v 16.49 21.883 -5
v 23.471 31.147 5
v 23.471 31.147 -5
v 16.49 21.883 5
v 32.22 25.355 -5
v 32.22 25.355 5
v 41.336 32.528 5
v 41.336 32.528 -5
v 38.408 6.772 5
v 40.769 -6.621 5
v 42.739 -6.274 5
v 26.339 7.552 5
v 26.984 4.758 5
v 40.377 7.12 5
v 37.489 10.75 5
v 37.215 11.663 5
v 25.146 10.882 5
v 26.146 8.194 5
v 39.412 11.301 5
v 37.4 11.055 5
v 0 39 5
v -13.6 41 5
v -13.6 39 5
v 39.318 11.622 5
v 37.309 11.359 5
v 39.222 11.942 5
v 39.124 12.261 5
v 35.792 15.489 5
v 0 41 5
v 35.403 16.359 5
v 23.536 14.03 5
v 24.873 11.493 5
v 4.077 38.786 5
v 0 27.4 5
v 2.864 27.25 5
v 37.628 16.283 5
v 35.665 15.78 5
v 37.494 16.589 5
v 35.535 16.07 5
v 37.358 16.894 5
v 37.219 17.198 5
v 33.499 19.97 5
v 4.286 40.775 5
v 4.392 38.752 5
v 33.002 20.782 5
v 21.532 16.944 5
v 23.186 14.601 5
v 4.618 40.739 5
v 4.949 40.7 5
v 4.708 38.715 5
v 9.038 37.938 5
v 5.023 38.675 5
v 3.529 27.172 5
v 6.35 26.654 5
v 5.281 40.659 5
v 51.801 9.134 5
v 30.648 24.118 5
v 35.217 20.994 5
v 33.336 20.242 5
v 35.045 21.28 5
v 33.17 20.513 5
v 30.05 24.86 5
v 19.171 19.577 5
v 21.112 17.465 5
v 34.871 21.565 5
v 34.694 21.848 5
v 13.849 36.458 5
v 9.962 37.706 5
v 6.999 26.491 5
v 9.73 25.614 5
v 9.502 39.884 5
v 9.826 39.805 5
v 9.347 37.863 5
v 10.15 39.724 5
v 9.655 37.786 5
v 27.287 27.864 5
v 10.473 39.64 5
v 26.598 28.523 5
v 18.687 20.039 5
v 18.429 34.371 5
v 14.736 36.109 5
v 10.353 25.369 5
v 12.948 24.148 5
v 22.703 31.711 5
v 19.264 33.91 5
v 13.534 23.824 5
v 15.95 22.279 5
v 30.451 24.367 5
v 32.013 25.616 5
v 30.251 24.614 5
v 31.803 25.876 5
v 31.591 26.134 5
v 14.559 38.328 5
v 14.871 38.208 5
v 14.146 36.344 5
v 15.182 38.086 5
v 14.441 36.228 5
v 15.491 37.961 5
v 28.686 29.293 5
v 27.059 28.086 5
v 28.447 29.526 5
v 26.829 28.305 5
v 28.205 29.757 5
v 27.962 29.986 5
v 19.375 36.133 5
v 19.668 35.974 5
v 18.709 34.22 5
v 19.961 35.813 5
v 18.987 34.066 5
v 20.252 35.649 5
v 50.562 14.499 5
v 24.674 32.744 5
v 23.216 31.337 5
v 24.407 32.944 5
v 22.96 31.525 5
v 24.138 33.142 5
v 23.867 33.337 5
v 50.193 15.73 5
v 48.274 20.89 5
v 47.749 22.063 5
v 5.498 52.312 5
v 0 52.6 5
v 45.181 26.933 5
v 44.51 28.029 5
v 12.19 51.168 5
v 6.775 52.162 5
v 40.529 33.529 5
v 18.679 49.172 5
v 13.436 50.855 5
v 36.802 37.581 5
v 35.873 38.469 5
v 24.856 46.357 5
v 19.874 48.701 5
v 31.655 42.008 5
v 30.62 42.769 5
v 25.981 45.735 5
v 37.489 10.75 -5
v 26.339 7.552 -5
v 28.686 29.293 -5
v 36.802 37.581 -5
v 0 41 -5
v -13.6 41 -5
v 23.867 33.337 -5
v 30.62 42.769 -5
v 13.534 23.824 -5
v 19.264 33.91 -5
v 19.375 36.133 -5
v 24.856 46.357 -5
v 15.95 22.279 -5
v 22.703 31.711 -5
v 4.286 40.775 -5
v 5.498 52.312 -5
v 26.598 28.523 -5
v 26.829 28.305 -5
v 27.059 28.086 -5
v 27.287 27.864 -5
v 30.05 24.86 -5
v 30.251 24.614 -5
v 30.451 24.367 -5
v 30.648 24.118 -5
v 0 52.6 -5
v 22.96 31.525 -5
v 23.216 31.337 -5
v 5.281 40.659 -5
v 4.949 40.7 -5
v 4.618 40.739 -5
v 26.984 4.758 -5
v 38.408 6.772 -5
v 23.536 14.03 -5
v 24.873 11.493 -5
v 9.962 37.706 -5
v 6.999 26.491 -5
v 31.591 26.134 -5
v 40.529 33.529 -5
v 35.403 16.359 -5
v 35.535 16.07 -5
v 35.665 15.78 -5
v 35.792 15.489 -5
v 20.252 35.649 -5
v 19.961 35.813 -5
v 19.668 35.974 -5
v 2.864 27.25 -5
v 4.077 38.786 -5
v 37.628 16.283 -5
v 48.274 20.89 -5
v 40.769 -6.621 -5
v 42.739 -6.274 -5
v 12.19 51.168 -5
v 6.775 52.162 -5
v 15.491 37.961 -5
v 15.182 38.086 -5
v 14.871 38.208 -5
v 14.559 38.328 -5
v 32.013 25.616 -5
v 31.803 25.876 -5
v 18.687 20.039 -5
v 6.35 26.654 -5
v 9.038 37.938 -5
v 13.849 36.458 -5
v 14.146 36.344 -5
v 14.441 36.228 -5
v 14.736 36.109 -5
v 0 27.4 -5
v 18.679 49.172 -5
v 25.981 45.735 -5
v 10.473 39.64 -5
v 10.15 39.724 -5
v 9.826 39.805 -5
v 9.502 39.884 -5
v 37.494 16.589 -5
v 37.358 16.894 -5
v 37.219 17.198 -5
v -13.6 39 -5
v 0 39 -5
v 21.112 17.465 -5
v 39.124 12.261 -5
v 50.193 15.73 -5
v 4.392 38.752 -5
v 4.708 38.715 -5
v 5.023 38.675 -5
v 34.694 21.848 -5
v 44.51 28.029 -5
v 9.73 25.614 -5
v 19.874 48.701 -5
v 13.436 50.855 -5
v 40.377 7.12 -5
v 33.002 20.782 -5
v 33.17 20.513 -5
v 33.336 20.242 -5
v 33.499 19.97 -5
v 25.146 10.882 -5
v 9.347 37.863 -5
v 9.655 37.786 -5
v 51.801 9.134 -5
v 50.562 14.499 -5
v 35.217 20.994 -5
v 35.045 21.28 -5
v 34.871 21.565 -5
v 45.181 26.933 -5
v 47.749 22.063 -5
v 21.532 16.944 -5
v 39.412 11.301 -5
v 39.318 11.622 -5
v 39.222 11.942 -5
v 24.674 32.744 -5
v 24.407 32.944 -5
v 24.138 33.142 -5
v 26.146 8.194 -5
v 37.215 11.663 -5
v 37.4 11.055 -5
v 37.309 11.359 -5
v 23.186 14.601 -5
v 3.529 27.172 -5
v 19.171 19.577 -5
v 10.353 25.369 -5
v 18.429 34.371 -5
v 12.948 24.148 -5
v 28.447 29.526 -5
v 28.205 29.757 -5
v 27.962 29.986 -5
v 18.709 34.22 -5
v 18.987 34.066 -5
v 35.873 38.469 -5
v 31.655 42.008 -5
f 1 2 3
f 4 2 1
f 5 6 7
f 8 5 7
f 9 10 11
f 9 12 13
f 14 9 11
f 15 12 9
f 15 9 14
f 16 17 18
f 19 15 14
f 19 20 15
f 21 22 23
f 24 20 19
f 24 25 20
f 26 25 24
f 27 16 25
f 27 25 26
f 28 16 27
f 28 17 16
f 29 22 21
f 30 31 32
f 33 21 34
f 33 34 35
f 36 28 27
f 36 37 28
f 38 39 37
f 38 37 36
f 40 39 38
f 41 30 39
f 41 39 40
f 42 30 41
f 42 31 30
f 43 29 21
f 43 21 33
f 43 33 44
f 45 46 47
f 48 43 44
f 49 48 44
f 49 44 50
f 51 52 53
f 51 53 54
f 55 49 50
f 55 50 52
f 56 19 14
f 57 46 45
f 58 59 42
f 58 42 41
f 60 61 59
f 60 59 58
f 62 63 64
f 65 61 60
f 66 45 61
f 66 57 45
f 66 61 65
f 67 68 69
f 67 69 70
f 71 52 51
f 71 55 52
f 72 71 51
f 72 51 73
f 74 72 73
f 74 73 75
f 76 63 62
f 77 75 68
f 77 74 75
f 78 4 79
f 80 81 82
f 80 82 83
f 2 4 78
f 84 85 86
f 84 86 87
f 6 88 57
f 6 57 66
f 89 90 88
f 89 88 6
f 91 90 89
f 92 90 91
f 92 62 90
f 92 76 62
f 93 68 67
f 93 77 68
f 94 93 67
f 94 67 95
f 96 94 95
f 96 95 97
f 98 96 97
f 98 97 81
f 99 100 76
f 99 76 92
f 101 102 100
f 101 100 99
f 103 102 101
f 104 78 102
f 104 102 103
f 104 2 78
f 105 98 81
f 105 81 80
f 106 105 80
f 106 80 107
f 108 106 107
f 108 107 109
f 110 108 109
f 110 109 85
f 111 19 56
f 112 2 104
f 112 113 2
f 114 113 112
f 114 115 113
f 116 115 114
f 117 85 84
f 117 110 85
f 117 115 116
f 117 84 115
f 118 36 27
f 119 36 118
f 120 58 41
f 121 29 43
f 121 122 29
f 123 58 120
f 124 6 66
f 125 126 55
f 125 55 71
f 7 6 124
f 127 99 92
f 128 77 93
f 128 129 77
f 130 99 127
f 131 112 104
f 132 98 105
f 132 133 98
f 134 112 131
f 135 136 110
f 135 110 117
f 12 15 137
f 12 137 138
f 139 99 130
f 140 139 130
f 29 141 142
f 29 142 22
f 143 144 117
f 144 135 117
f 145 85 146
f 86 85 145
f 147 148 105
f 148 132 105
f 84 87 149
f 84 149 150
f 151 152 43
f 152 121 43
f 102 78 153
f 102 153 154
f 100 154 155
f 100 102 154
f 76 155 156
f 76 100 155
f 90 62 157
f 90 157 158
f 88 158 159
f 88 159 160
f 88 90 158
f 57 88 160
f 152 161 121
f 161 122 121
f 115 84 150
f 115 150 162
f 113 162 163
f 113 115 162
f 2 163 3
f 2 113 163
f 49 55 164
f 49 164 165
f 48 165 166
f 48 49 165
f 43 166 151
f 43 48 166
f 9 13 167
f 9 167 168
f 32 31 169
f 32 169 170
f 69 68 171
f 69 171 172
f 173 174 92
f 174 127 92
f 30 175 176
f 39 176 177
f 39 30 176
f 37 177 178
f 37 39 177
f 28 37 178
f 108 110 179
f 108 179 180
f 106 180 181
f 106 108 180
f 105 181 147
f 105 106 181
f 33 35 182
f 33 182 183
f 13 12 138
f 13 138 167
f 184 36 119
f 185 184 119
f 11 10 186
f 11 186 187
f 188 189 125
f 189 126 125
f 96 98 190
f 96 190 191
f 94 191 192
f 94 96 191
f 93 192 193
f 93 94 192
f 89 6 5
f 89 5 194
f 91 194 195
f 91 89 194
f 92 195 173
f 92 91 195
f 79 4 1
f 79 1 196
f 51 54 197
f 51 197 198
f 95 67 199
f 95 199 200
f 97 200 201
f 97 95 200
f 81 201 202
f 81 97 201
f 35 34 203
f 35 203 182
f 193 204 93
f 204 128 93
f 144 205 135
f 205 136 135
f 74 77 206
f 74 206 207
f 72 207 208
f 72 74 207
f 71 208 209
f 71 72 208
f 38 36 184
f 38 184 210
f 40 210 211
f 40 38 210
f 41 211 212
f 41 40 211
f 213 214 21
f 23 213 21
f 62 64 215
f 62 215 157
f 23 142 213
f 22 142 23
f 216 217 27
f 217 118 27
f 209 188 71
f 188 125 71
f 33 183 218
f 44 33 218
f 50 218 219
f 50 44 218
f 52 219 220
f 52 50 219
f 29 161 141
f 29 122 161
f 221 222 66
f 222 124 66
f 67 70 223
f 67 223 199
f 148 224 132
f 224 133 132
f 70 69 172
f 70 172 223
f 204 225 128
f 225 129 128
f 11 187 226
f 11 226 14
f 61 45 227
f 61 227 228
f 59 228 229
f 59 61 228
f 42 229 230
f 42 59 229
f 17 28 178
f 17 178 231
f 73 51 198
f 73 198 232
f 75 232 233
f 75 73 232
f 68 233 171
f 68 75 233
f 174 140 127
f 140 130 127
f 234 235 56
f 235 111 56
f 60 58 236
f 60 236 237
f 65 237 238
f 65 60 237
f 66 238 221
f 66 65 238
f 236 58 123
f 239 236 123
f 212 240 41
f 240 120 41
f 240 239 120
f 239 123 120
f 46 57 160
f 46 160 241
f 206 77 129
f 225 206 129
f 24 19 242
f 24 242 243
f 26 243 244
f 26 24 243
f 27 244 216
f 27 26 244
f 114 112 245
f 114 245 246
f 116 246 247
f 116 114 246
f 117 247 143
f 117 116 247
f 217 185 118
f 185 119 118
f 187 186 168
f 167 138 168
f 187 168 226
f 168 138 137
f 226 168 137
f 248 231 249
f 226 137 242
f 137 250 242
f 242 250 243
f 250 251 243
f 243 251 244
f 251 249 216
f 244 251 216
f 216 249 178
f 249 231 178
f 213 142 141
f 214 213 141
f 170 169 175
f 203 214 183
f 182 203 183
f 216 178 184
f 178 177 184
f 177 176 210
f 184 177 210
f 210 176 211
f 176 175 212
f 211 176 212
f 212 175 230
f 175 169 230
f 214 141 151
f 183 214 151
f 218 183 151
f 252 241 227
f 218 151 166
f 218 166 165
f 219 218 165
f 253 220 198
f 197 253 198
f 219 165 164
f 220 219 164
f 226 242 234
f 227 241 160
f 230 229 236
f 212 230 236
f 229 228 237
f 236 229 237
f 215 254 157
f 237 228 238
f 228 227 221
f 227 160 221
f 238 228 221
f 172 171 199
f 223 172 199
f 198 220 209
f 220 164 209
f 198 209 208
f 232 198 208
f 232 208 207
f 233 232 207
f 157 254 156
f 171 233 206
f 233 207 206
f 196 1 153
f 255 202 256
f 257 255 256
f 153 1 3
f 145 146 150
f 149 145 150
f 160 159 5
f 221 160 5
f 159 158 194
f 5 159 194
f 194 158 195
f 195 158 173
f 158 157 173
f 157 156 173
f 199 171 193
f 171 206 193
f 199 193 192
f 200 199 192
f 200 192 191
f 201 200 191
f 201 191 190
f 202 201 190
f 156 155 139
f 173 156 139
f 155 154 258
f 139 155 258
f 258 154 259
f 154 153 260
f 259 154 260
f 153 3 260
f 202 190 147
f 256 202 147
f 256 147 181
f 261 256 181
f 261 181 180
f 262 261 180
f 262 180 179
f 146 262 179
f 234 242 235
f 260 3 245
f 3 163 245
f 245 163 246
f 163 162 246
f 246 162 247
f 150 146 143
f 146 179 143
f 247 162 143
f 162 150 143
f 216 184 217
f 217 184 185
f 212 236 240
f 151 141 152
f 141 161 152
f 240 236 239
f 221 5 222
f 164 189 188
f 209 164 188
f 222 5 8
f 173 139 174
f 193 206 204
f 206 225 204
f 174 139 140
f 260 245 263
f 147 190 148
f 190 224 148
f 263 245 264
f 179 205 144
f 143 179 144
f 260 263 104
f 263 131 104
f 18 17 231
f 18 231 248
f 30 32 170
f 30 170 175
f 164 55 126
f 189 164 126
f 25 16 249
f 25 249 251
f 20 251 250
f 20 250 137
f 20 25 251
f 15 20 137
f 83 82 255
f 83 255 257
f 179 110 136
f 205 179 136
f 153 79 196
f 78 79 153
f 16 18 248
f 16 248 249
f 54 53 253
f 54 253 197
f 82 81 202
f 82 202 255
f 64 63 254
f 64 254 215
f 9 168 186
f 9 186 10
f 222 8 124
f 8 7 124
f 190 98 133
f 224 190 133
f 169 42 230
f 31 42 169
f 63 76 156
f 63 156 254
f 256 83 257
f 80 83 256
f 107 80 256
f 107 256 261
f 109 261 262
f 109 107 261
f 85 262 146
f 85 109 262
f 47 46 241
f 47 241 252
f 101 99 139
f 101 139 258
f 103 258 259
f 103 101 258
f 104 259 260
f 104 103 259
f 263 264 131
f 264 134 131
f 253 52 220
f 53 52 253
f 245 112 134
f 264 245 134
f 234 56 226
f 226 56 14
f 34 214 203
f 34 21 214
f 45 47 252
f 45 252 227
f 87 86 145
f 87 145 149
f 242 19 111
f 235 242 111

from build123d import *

# Parameters (mm, degrees)
AUFSATZ_LINEAR_AUSTRAGEN1_DEPTH = 5
AUFSATZ_LINEAR_AUSTRAGEN2_DEPTH = 5
KREISMUSTER1_COUNT              = 11
KREISMUSTER1_ANGLE              = 74
AUFSATZ_LINEAR_AUSTRAGEN4_DEPTH = 5
AUFSATZ_LINEAR_AUSTRAGEN3_DEPTH = 5
KREISMUSTER4_COUNT              = 11
KREISMUSTER4_ANGLE              = 74
SKIZZE5_W                       = 10
SKIZZE5_H                       = 2
AUFSATZ_LINEAR_AUSTRAGEN5_DEPTH = 13.6
SKIZZE6_W                       = 2
SKIZZE6_H                       = 10
AUFSATZ_LINEAR_AUSTRAGEN6_DEPTH = 13.6


with BuildPart() as part:
    # Skizze1 → Aufsatz-Linear austragen1 (new, symmetric)
    with BuildSketch(Plane.XY):
        with BuildLine():
            Line((0, 41), (0, 40))
            ThreePointArc((0, 40), (25.711504387, 30.641777725), (39.39231012, 6.945927107))
            Line((39.39231012, 6.945927107), (40.377117874, 7.119575284))
            ThreePointArc((40.377117874, 7.119575284), (26.354291997, 31.407822168), (0, 41))
        make_face()
    extrude(amount=AUFSATZ_LINEAR_AUSTRAGEN1_DEPTH, both=True)

    # Skizze2 → Aufsatz-Linear austragen2 (add, symmetric)
    with BuildSketch(Plane.XY):
        with BuildLine():
            Line((0, 52.6), (0, 41))
            ThreePointArc((0, 41), (2.145774206, 40.943810925), (4.285666994, 40.77539771))
            Line((4.285666994, 40.77539771), (5.498197168, 52.311851696))
            Line((5.498197168, 52.311851696), (0, 52.6))
        make_face()
    aufsatz_linear_austragen2 = extrude(amount=AUFSATZ_LINEAR_AUSTRAGEN2_DEPTH, both=True)

    # Kreismuster1: Aufsatz-Linear austragen2 ×11 about axis
    kreismuster1_axis = Axis((0, 0, -5.5), (0, 0, -1))
    for i in range(1, KREISMUSTER1_COUNT):
        add(aufsatz_linear_austragen2.rotate(kreismuster1_axis, i * KREISMUSTER1_ANGLE / (KREISMUSTER1_COUNT - 1)))

    # Skizze4 → Aufsatz-Linear austragen4 (add, symmetric)
    with BuildSketch(Plane.XY):
        with BuildLine():
            Line((0, 40), (0, 39))
            ThreePointArc((0, 39), (25.068716778, 29.875733282), (38.407502367, 6.772278929))
            Line((38.407502367, 6.772278929), (39.39231012, 6.945927107))
            ThreePointArc((39.39231012, 6.945927107), (25.711504387, 30.641777725), (0, 40))
        make_face()
    extrude(amount=AUFSATZ_LINEAR_AUSTRAGEN4_DEPTH, both=True)

    # Skizze3 → Aufsatz-Linear austragen3 (add, symmetric)
    with BuildSketch(Plane.XY):
        Polygon((4.181138531, 39.780875815), (0, 40), (0, 27.4), (2.864079894, 27.249899933), align=None)
    aufsatz_linear_austragen3 = extrude(amount=AUFSATZ_LINEAR_AUSTRAGEN3_DEPTH, both=True)

    # Kreismuster4: Aufsatz-Linear austragen3 ×11 about axis
    kreismuster4_axis = Axis((0, 0, -5.5), (0, 0, -1))
    for i in range(1, KREISMUSTER4_COUNT):
        add(aufsatz_linear_austragen3.rotate(kreismuster4_axis, i * KREISMUSTER4_ANGLE / (KREISMUSTER4_COUNT - 1)))

    # Skizze5 → Aufsatz-Linear austragen5 (add)
    with BuildSketch(Plane.ZY):
        with Locations((0, 40)):
            Rectangle(SKIZZE5_W, SKIZZE5_H)
    extrude(amount=AUFSATZ_LINEAR_AUSTRAGEN5_DEPTH)

    # Skizze6 → Aufsatz-Linear austragen6 (add)
    with BuildSketch(Plane(origin=(0, 0, 0), x_dir=(0.9848077530122074, 0.1736481776669343, 0), z_dir=(0.1736481776669343, -0.9848077530122074, 0))):
        with Locations((40, 0)):
            Rectangle(SKIZZE6_W, SKIZZE6_H)
    extrude(amount=AUFSATZ_LINEAR_AUSTRAGEN6_DEPTH)


solid = part.part
